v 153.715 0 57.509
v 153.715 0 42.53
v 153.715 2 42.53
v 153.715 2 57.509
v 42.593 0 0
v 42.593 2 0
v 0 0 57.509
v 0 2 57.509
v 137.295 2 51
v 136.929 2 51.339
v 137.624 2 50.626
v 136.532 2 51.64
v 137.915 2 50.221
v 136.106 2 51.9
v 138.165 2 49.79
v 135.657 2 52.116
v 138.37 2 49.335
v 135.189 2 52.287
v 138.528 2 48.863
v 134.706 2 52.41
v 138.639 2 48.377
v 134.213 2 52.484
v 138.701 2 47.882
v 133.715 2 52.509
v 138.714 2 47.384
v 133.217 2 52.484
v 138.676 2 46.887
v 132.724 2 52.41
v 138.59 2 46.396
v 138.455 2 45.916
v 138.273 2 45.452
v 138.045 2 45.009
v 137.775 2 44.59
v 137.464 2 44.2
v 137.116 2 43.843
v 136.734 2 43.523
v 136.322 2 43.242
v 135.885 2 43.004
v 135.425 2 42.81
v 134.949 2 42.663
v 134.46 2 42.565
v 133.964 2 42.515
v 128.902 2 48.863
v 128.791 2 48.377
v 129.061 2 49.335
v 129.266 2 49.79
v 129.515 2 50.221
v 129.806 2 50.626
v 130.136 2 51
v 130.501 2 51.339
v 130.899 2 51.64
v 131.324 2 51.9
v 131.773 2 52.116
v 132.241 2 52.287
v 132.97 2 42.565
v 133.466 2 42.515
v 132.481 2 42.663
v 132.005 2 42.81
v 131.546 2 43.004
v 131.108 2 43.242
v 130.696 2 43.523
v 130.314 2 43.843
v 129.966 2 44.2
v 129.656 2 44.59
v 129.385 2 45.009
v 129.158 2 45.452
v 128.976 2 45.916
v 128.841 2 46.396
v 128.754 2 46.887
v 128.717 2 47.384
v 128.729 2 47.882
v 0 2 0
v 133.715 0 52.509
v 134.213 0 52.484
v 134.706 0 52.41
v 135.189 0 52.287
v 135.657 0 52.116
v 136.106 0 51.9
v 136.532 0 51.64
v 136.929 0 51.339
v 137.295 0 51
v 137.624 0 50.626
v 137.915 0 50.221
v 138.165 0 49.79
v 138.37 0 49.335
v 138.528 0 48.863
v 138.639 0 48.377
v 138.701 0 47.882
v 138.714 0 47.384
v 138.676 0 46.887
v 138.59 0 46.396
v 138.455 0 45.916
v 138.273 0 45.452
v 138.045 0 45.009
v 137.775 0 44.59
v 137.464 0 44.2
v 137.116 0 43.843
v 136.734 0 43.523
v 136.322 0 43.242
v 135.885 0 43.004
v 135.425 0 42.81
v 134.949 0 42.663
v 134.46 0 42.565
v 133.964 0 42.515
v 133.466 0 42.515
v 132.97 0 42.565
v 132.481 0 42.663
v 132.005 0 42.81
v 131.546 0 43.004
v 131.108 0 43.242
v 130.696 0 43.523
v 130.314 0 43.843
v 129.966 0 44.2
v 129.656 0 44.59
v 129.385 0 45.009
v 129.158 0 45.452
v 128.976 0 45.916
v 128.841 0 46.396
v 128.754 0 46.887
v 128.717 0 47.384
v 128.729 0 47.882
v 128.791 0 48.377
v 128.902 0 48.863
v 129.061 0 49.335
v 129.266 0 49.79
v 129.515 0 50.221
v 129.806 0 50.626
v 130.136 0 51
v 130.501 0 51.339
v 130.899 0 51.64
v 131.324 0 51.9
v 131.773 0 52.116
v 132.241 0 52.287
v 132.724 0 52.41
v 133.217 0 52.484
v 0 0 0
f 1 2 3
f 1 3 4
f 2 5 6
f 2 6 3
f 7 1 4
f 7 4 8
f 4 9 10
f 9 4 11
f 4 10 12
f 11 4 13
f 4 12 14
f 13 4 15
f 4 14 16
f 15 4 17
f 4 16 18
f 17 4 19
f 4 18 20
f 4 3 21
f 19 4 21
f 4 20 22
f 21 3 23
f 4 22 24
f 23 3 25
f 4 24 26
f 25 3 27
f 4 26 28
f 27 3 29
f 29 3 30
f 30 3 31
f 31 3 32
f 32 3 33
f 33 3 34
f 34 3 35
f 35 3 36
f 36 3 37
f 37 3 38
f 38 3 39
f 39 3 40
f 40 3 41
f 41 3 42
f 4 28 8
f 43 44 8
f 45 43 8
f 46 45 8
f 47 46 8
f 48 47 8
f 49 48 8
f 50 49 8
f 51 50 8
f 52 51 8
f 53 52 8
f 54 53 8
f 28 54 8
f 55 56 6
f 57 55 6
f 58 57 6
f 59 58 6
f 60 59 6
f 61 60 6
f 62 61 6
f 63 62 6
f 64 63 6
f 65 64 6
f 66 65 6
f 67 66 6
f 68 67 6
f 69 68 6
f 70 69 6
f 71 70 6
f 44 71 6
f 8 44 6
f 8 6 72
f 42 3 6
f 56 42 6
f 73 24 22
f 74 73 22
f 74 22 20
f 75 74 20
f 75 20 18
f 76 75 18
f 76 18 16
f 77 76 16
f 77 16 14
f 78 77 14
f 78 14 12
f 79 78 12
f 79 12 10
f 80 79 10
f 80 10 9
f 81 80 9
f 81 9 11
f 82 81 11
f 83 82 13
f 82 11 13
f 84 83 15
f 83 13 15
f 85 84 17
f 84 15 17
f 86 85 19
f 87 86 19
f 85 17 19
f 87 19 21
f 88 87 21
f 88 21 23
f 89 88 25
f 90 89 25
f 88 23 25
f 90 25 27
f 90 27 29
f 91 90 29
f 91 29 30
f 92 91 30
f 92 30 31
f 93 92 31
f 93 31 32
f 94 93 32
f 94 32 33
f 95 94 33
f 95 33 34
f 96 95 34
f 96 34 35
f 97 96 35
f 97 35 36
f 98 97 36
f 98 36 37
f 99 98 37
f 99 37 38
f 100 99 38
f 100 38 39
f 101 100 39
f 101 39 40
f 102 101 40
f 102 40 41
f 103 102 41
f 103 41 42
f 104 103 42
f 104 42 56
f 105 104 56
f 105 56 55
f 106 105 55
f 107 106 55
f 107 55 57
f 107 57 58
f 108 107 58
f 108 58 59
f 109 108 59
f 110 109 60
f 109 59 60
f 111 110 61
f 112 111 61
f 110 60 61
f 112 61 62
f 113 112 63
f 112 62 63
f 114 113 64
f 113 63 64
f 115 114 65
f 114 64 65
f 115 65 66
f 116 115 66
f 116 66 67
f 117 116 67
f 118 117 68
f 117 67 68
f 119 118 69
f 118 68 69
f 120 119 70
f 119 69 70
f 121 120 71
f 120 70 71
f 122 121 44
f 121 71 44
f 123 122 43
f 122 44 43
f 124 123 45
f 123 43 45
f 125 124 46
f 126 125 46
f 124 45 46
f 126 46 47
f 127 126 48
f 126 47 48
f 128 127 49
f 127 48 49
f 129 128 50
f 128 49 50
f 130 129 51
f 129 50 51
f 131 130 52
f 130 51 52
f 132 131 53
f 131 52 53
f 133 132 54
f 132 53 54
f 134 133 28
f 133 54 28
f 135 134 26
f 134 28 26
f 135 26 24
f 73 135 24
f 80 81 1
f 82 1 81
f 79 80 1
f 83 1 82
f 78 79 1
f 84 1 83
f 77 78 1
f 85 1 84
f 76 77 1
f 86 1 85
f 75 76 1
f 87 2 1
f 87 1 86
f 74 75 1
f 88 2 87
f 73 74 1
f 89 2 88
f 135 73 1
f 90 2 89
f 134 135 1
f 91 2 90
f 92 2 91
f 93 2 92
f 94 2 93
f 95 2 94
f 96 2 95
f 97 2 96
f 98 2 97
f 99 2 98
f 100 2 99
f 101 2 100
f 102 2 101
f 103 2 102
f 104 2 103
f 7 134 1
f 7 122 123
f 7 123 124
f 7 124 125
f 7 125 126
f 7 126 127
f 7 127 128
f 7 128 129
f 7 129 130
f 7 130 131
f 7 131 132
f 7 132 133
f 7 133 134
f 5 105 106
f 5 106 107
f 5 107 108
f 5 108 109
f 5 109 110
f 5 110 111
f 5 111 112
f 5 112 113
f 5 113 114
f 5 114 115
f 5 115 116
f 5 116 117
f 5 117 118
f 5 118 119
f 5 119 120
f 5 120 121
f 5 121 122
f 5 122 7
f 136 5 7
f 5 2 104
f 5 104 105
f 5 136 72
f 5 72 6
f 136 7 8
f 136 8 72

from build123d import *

# Parameters (mm, degrees)
BOSS_EXTRUDE1_DEPTH = 2
SKETCH2_R           = 5
CUT_EXTRUDE1_DEPTH  = 165.132919655


with BuildPart() as part:
    # Sketch1 → Boss-Extrude1 (new body)
    with BuildSketch(Plane(origin=(0, 0, 0), x_dir=(1, 0, 0), z_dir=(0, 1, 0))):
        Polygon((0, 0), (42.592528424, 0), (153.715208146, -42.529795372), (153.715208146, -57.508695855), (0, -57.508695855), align=None)
    extrude(amount=BOSS_EXTRUDE1_DEPTH)

    # Sketch2 → Cut-Extrude1 (cut, through all)
    with BuildSketch(Plane(origin=(0, 2, 0), x_dir=(1, 0, 0), z_dir=(0, 1, 0))):
        with Locations(Location((133.715208146, -47.508695855, 0), (0, 0, 270))):
            Circle(SKETCH2_R)
    extrude(amount=-CUT_EXTRUDE1_DEPTH, mode=Mode.SUBTRACT)


solid = part.part
